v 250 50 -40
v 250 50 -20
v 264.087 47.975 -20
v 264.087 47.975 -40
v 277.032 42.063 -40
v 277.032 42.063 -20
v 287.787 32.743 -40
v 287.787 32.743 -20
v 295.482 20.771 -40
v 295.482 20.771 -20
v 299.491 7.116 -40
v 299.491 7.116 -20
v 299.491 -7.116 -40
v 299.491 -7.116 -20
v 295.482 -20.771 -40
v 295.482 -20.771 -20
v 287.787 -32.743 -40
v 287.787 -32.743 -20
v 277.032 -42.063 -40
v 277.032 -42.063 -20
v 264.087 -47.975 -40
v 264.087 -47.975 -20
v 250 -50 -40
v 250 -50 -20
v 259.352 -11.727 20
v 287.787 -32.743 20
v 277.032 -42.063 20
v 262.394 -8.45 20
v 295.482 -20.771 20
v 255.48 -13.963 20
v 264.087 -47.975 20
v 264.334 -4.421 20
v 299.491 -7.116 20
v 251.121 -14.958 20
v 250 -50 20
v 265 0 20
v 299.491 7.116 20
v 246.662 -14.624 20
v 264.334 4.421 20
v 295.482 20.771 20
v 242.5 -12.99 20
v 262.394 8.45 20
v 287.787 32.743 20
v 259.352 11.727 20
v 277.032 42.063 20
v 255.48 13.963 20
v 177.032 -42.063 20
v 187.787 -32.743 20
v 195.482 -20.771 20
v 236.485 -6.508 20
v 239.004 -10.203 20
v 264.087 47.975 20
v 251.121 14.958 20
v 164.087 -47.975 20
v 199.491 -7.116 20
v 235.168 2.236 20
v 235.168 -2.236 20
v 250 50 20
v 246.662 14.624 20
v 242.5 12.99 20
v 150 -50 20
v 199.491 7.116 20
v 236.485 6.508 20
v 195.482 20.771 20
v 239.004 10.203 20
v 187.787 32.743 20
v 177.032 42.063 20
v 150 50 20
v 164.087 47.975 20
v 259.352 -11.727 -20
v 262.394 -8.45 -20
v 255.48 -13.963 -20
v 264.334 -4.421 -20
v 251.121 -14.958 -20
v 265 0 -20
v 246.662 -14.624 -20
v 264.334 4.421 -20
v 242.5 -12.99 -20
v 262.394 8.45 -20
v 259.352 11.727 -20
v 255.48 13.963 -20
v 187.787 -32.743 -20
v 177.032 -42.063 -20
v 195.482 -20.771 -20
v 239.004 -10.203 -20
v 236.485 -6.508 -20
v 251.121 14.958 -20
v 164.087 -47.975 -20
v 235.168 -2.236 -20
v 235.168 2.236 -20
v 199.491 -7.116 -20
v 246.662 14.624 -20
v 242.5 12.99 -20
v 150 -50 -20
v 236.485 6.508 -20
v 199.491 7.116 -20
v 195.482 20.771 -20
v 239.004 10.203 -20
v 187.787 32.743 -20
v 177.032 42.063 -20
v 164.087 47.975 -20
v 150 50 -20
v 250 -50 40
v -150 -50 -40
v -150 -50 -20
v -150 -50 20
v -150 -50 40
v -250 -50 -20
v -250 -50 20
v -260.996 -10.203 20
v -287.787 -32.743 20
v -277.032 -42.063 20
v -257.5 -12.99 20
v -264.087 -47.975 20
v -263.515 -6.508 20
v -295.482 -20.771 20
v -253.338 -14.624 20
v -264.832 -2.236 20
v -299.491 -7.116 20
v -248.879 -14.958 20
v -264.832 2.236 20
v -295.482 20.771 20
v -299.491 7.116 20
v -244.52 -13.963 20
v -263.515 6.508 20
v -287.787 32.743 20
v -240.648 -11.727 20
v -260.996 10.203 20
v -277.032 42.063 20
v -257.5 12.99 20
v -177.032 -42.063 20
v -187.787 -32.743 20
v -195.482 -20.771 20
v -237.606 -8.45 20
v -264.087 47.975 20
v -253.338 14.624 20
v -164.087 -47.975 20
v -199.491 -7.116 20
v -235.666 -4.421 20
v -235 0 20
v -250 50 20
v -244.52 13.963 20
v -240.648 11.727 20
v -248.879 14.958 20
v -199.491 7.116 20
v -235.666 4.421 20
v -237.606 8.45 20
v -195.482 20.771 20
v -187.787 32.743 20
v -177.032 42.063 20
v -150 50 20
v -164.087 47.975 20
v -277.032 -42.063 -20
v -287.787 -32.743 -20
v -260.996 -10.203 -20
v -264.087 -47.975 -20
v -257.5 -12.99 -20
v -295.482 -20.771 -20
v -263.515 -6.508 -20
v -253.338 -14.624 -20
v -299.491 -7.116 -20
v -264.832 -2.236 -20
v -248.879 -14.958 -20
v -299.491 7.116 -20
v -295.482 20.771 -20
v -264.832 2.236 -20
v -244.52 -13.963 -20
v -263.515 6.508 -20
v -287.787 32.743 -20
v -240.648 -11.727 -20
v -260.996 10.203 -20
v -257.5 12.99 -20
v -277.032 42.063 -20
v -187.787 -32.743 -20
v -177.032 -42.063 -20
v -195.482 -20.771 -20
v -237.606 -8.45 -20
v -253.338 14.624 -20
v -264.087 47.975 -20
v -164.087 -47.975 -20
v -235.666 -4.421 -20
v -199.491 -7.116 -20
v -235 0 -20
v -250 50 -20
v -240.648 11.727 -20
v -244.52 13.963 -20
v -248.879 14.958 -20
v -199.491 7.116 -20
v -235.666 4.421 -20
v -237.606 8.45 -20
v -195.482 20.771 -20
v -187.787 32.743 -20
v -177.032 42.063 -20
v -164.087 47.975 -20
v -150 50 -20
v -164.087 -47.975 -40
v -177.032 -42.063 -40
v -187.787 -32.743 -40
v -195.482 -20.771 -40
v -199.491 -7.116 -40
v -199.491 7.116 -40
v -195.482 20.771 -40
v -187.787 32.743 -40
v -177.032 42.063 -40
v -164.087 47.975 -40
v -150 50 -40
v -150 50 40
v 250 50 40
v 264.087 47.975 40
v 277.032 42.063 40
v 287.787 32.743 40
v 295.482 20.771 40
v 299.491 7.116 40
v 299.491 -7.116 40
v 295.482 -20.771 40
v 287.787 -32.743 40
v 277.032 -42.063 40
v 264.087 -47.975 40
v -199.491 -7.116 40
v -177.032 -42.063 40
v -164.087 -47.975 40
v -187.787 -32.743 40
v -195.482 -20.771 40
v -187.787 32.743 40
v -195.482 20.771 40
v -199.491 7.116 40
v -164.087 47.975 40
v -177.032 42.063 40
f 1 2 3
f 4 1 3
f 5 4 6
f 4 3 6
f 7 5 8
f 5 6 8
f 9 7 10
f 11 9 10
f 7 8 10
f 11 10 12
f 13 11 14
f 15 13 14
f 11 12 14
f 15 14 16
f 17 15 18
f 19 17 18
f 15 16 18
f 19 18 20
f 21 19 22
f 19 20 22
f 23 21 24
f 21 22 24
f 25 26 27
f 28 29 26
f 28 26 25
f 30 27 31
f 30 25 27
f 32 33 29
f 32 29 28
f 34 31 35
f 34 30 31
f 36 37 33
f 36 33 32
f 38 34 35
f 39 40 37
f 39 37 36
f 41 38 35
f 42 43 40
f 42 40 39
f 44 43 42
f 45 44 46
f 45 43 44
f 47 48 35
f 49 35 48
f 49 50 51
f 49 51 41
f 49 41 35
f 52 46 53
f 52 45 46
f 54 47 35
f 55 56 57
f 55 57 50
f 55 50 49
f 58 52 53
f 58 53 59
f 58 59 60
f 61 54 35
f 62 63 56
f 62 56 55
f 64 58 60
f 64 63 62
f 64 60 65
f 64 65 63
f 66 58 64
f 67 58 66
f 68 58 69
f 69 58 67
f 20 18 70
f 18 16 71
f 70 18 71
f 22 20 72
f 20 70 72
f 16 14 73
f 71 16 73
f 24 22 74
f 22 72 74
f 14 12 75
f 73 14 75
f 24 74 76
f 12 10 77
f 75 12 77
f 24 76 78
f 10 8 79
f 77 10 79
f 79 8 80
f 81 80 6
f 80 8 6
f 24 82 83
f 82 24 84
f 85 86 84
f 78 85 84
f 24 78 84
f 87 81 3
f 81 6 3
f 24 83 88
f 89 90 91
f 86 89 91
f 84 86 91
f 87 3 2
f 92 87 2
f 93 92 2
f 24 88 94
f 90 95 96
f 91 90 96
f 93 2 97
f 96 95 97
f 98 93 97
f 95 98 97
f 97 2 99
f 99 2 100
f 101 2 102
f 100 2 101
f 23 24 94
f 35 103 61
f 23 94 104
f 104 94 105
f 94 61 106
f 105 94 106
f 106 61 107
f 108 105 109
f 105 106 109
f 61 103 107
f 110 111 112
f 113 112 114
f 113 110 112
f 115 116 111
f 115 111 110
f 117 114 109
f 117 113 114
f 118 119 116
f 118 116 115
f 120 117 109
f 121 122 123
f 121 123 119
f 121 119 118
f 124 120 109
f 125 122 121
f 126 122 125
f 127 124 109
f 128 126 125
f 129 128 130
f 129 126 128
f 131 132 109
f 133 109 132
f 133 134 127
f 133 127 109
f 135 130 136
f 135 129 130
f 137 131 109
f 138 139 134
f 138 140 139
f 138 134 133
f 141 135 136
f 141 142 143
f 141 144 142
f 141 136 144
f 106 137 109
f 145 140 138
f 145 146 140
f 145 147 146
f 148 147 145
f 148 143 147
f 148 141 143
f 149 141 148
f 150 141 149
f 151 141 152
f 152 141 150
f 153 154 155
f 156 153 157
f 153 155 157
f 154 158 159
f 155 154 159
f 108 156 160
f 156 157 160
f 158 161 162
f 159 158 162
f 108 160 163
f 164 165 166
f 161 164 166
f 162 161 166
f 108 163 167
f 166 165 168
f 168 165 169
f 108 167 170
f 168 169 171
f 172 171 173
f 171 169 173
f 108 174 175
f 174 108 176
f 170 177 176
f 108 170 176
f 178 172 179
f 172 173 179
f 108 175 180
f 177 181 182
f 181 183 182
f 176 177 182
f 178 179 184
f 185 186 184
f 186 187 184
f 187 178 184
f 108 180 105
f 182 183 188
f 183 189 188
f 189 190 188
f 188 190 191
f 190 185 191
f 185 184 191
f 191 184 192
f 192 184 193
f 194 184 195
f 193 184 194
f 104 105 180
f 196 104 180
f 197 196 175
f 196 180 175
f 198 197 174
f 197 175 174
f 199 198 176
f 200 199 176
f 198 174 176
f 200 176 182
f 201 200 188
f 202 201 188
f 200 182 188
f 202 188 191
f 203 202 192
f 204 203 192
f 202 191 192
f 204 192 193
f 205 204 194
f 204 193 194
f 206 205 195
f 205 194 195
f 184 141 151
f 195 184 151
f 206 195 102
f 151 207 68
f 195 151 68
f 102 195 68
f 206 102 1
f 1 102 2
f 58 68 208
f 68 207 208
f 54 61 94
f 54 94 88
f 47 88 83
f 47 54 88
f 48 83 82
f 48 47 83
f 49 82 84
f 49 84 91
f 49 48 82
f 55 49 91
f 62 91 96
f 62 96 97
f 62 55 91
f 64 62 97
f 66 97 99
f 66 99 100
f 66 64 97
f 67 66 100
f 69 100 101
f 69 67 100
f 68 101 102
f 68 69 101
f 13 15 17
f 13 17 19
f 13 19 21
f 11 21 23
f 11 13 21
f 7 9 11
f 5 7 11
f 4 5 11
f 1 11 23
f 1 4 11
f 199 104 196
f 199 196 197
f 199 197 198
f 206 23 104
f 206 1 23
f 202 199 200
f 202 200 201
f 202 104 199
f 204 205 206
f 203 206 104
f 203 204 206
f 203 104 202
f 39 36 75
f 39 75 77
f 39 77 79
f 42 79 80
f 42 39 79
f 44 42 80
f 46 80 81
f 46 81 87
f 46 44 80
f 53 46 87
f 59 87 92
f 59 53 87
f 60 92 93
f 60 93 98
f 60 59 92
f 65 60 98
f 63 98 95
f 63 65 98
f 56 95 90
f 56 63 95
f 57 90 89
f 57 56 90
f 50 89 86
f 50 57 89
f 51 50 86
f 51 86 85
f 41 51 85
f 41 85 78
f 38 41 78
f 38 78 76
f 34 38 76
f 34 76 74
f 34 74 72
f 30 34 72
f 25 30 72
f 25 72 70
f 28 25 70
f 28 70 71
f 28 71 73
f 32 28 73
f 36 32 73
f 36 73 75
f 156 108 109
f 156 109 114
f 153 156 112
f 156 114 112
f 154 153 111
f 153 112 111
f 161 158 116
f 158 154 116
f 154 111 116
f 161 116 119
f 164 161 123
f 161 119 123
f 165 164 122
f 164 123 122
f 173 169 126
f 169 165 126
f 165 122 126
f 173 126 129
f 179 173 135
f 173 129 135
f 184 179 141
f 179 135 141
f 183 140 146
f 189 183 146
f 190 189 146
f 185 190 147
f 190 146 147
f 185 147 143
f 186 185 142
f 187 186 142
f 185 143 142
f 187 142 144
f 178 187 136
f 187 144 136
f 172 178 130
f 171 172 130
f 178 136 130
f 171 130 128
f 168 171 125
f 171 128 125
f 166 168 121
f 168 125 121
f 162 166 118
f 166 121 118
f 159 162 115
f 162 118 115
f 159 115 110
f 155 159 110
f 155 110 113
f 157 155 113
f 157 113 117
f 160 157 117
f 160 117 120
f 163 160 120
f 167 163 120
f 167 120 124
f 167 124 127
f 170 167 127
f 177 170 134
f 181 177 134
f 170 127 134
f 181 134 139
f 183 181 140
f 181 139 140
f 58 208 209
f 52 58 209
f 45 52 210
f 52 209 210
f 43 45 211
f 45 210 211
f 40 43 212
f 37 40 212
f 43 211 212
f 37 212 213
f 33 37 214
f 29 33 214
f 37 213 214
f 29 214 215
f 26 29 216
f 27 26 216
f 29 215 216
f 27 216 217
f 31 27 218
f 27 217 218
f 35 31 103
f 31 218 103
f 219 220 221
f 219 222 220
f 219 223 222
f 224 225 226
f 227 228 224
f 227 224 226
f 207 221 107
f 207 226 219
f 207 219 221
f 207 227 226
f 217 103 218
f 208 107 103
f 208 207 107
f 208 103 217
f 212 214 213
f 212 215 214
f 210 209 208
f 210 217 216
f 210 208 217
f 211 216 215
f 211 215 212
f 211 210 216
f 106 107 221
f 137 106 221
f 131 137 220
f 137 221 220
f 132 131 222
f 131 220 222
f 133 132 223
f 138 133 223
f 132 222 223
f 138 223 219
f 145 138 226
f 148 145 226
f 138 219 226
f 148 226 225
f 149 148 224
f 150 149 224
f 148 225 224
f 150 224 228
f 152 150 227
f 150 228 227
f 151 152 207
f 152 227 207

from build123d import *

# Parameters (mm, degrees)
BOSS_EXTRUDE2_DEPTH = 40
CUT_EXTRUDE2_DEPTH  = 20
CUT_EXTRUDE3_START  = -20
CUT_EXTRUDE3_DEPTH  = 20
SKETCH9_R           = 15
CUT_EXTRUDE5_DEPTH  = 40
CUT_EXTRUDE6_DEPTH  = 20
SKETCH11_R          = 15
BOSS_EXTRUDE3_DEPTH = 80


with BuildPart() as part:
    # Sketch4 → Boss-Extrude2 (new, symmetric)
    with BuildSketch(Plane.XY):
        with BuildLine():
            Line((-250, 50), (250, 50))
            ThreePointArc((250, 50), (300, 0), (250, -50))
            Line((250, -50), (-250, -50))
            ThreePointArc((-250, -50), (-300, 0), (-250, 50))
        make_face()
    extrude(amount=BOSS_EXTRUDE2_DEPTH, both=True)

    # Sketch5 → Cut-Extrude2 (cut)
    with BuildSketch(Plane.XY.offset(40)):
        with BuildLine():
            Line((-150, 50), (-250, 50))
            ThreePointArc((-250, 50), (-300, 0), (-250, -50))
            Line((-250, -50), (-150, -50))
            ThreePointArc((-150, -50), (-200, 0), (-150, 50))
        make_face()
    extrude(amount=-CUT_EXTRUDE2_DEPTH, mode=Mode.SUBTRACT)

    # Sketch6 → Cut-Extrude3 (cut)
    with BuildSketch(Plane(origin=(0, 0, -40), x_dir=(-1, 0, 0), z_dir=(0, 0, -1)).offset(CUT_EXTRUDE3_START)):
        with BuildLine():
            Line((150, 50), (250, 50))
            ThreePointArc((250, 50), (300, 0), (250, -50))
            Line((250, -50), (150, -50))
            ThreePointArc((150, -50), (200, 0), (150, 50))
        make_face()
    extrude(amount=CUT_EXTRUDE3_DEPTH, mode=Mode.SUBTRACT)

    # Sketch9 → Cut-Extrude5 (cut)
    with BuildSketch(Plane.XY.offset(20)):
        with Locations((-250, 0)):
            Circle(SKETCH9_R)
    extrude(amount=-CUT_EXTRUDE5_DEPTH, mode=Mode.SUBTRACT)

    # Sketch10 → Cut-Extrude6 (cut, symmetric)
    with BuildSketch(Plane.XY):
        with BuildLine():
            Line((150, 50), (250, 50))
            ThreePointArc((250, 50), (300, 0), (250, -50))
            Line((250, -50), (150, -50))
            ThreePointArc((150, -50), (200, 0), (150, 50))
        make_face()
    extrude(amount=CUT_EXTRUDE6_DEPTH, both=True, mode=Mode.SUBTRACT)

    # Sketch11 → Boss-Extrude3 (add)
    with BuildSketch(Plane.XY.offset(40)):
        with Locations((250, 0)):
            Circle(SKETCH11_R)
    extrude(amount=-BOSS_EXTRUDE3_DEPTH)


solid = part.part
